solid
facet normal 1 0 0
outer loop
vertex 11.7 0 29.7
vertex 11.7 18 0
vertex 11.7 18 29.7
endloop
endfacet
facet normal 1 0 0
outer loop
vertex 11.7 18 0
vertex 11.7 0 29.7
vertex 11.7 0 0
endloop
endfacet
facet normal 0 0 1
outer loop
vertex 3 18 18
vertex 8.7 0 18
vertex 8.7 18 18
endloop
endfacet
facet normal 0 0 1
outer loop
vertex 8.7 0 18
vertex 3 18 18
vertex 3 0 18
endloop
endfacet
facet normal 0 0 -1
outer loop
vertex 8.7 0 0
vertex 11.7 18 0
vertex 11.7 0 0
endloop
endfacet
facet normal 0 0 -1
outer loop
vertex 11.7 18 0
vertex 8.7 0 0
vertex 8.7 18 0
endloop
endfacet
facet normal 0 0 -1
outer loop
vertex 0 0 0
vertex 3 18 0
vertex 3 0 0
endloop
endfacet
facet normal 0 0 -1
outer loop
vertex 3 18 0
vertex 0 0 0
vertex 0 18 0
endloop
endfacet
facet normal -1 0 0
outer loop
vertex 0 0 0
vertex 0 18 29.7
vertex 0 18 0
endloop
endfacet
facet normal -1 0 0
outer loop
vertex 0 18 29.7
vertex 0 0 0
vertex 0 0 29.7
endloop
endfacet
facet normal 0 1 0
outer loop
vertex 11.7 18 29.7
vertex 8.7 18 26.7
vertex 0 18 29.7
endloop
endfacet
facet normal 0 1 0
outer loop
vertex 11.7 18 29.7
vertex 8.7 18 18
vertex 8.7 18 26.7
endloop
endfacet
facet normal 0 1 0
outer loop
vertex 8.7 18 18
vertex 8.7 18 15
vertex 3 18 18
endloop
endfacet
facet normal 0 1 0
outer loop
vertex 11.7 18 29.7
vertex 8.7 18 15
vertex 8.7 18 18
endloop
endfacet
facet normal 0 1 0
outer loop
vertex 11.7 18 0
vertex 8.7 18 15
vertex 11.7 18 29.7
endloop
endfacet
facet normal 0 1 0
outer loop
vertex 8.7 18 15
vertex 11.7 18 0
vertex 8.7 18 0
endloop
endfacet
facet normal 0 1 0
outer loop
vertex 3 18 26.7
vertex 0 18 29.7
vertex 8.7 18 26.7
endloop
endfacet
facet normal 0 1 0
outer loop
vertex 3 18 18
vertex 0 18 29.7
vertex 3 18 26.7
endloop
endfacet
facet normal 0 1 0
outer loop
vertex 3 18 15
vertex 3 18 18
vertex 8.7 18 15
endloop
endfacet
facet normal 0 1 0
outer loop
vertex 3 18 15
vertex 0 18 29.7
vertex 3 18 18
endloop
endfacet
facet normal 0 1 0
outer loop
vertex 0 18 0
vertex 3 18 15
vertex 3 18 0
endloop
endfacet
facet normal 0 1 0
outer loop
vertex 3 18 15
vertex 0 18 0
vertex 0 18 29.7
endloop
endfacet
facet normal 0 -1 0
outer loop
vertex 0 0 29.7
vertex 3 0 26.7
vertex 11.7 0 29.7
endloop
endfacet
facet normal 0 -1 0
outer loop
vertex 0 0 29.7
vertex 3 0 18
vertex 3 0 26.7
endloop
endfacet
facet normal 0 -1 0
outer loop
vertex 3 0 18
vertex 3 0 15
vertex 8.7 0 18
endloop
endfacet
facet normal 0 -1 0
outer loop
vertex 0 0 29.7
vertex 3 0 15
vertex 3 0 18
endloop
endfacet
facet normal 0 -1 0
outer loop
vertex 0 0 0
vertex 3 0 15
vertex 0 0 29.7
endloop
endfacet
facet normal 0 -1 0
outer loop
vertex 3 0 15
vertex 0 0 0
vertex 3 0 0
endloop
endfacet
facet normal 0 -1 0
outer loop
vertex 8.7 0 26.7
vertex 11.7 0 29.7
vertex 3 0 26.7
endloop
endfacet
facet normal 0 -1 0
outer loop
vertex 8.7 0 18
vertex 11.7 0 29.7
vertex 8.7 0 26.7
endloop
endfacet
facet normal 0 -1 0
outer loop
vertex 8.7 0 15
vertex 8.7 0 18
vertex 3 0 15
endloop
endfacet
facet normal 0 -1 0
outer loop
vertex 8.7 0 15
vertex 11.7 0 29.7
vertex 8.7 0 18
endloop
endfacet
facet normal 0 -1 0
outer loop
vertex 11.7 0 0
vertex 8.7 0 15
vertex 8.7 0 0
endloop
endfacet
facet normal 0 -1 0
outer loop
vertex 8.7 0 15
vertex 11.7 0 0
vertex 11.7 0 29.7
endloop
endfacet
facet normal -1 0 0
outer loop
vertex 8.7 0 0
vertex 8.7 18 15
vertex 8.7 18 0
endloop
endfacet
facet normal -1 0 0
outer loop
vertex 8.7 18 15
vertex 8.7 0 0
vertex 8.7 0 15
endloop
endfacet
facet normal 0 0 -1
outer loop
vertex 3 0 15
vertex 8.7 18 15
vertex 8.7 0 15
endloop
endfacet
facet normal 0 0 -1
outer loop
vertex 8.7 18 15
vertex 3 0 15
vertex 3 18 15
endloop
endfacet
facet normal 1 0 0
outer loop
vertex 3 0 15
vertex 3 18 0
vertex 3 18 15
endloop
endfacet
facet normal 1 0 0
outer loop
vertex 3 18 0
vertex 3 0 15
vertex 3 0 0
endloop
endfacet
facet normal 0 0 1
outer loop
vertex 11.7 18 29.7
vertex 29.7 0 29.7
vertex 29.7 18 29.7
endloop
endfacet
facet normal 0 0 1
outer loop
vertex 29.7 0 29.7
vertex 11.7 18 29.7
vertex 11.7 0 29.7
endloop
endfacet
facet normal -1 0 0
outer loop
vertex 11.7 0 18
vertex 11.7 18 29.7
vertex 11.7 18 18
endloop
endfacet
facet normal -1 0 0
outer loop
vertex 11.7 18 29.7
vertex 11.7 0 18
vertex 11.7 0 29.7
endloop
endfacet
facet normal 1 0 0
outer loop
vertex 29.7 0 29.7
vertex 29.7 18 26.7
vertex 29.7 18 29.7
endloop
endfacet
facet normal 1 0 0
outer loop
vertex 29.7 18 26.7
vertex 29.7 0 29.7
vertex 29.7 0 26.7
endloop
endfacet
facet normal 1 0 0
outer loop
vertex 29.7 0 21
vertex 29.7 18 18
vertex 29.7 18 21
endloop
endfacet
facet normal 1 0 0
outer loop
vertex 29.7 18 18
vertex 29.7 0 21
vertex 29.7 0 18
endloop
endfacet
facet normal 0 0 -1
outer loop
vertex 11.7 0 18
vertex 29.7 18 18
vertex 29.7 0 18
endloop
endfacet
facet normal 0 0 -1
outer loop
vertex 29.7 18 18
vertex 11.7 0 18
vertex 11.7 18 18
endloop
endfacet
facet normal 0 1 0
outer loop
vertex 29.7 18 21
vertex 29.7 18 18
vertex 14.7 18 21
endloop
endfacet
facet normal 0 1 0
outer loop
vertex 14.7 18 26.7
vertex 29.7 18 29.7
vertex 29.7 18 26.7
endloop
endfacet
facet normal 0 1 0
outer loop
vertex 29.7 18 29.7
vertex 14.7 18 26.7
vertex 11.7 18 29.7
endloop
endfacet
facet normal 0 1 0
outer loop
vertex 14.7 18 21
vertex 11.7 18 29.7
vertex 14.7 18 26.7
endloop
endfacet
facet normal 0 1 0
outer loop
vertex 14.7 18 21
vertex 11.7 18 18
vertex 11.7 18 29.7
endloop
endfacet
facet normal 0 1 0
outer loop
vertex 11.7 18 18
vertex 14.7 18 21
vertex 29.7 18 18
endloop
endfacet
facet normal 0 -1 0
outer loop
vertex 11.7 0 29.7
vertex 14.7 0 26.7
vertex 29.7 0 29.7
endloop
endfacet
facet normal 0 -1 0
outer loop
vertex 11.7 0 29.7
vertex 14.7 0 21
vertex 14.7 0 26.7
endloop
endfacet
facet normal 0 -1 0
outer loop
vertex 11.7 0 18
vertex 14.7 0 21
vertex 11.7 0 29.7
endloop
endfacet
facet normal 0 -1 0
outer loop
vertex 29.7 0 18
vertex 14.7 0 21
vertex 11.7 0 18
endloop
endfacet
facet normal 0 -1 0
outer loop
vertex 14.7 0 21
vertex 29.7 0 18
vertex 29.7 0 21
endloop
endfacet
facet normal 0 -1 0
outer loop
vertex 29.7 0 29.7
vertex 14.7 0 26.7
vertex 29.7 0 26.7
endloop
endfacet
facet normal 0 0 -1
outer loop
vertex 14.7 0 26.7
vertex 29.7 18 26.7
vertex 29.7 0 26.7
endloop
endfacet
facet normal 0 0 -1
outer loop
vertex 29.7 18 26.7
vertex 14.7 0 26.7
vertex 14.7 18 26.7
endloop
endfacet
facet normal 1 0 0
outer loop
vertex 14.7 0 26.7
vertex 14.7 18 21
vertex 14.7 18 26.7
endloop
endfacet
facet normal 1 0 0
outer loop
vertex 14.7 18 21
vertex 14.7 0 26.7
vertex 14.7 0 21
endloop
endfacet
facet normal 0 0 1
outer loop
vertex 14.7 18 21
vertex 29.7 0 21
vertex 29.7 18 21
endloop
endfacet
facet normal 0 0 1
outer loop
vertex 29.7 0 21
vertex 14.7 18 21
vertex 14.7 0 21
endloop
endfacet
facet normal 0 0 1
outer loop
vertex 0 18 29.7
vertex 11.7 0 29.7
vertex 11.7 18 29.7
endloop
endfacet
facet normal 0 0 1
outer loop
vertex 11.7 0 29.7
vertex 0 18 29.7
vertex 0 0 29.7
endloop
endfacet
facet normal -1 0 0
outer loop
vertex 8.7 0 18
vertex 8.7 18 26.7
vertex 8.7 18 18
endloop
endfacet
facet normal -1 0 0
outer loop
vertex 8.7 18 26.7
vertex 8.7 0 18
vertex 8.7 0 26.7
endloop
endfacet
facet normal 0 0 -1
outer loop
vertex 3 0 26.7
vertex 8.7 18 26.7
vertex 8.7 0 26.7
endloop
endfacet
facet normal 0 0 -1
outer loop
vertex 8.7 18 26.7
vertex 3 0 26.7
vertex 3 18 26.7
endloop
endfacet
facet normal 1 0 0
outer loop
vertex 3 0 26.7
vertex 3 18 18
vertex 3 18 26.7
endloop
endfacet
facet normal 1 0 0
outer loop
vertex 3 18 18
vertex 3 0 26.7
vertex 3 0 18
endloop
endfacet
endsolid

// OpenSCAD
union () {
  difference () {
    cube ([11.7, 18, 18]);
    translate ([3, -0.5, -1]) {
      cube ([5.7, 19, 16]);
    }
  }
  translate ([29.7, 0, 18]) {
    rotate (a=-90.0, v=[0, 1, 0]) {
      difference () {
        cube ([11.7, 18, 18]);
        translate ([3, -0.5, -1]) {
          cube ([5.7, 19, 16]);
        }
      }
    }
  }
  translate ([0, 0, 18]) {
    difference () {
      cube ([11.7, 18, 11.7]);
      translate ([3, -0.5, -1]) {
        cube ([5.7, 19, 9.7]);
      }
    }
  }
}
